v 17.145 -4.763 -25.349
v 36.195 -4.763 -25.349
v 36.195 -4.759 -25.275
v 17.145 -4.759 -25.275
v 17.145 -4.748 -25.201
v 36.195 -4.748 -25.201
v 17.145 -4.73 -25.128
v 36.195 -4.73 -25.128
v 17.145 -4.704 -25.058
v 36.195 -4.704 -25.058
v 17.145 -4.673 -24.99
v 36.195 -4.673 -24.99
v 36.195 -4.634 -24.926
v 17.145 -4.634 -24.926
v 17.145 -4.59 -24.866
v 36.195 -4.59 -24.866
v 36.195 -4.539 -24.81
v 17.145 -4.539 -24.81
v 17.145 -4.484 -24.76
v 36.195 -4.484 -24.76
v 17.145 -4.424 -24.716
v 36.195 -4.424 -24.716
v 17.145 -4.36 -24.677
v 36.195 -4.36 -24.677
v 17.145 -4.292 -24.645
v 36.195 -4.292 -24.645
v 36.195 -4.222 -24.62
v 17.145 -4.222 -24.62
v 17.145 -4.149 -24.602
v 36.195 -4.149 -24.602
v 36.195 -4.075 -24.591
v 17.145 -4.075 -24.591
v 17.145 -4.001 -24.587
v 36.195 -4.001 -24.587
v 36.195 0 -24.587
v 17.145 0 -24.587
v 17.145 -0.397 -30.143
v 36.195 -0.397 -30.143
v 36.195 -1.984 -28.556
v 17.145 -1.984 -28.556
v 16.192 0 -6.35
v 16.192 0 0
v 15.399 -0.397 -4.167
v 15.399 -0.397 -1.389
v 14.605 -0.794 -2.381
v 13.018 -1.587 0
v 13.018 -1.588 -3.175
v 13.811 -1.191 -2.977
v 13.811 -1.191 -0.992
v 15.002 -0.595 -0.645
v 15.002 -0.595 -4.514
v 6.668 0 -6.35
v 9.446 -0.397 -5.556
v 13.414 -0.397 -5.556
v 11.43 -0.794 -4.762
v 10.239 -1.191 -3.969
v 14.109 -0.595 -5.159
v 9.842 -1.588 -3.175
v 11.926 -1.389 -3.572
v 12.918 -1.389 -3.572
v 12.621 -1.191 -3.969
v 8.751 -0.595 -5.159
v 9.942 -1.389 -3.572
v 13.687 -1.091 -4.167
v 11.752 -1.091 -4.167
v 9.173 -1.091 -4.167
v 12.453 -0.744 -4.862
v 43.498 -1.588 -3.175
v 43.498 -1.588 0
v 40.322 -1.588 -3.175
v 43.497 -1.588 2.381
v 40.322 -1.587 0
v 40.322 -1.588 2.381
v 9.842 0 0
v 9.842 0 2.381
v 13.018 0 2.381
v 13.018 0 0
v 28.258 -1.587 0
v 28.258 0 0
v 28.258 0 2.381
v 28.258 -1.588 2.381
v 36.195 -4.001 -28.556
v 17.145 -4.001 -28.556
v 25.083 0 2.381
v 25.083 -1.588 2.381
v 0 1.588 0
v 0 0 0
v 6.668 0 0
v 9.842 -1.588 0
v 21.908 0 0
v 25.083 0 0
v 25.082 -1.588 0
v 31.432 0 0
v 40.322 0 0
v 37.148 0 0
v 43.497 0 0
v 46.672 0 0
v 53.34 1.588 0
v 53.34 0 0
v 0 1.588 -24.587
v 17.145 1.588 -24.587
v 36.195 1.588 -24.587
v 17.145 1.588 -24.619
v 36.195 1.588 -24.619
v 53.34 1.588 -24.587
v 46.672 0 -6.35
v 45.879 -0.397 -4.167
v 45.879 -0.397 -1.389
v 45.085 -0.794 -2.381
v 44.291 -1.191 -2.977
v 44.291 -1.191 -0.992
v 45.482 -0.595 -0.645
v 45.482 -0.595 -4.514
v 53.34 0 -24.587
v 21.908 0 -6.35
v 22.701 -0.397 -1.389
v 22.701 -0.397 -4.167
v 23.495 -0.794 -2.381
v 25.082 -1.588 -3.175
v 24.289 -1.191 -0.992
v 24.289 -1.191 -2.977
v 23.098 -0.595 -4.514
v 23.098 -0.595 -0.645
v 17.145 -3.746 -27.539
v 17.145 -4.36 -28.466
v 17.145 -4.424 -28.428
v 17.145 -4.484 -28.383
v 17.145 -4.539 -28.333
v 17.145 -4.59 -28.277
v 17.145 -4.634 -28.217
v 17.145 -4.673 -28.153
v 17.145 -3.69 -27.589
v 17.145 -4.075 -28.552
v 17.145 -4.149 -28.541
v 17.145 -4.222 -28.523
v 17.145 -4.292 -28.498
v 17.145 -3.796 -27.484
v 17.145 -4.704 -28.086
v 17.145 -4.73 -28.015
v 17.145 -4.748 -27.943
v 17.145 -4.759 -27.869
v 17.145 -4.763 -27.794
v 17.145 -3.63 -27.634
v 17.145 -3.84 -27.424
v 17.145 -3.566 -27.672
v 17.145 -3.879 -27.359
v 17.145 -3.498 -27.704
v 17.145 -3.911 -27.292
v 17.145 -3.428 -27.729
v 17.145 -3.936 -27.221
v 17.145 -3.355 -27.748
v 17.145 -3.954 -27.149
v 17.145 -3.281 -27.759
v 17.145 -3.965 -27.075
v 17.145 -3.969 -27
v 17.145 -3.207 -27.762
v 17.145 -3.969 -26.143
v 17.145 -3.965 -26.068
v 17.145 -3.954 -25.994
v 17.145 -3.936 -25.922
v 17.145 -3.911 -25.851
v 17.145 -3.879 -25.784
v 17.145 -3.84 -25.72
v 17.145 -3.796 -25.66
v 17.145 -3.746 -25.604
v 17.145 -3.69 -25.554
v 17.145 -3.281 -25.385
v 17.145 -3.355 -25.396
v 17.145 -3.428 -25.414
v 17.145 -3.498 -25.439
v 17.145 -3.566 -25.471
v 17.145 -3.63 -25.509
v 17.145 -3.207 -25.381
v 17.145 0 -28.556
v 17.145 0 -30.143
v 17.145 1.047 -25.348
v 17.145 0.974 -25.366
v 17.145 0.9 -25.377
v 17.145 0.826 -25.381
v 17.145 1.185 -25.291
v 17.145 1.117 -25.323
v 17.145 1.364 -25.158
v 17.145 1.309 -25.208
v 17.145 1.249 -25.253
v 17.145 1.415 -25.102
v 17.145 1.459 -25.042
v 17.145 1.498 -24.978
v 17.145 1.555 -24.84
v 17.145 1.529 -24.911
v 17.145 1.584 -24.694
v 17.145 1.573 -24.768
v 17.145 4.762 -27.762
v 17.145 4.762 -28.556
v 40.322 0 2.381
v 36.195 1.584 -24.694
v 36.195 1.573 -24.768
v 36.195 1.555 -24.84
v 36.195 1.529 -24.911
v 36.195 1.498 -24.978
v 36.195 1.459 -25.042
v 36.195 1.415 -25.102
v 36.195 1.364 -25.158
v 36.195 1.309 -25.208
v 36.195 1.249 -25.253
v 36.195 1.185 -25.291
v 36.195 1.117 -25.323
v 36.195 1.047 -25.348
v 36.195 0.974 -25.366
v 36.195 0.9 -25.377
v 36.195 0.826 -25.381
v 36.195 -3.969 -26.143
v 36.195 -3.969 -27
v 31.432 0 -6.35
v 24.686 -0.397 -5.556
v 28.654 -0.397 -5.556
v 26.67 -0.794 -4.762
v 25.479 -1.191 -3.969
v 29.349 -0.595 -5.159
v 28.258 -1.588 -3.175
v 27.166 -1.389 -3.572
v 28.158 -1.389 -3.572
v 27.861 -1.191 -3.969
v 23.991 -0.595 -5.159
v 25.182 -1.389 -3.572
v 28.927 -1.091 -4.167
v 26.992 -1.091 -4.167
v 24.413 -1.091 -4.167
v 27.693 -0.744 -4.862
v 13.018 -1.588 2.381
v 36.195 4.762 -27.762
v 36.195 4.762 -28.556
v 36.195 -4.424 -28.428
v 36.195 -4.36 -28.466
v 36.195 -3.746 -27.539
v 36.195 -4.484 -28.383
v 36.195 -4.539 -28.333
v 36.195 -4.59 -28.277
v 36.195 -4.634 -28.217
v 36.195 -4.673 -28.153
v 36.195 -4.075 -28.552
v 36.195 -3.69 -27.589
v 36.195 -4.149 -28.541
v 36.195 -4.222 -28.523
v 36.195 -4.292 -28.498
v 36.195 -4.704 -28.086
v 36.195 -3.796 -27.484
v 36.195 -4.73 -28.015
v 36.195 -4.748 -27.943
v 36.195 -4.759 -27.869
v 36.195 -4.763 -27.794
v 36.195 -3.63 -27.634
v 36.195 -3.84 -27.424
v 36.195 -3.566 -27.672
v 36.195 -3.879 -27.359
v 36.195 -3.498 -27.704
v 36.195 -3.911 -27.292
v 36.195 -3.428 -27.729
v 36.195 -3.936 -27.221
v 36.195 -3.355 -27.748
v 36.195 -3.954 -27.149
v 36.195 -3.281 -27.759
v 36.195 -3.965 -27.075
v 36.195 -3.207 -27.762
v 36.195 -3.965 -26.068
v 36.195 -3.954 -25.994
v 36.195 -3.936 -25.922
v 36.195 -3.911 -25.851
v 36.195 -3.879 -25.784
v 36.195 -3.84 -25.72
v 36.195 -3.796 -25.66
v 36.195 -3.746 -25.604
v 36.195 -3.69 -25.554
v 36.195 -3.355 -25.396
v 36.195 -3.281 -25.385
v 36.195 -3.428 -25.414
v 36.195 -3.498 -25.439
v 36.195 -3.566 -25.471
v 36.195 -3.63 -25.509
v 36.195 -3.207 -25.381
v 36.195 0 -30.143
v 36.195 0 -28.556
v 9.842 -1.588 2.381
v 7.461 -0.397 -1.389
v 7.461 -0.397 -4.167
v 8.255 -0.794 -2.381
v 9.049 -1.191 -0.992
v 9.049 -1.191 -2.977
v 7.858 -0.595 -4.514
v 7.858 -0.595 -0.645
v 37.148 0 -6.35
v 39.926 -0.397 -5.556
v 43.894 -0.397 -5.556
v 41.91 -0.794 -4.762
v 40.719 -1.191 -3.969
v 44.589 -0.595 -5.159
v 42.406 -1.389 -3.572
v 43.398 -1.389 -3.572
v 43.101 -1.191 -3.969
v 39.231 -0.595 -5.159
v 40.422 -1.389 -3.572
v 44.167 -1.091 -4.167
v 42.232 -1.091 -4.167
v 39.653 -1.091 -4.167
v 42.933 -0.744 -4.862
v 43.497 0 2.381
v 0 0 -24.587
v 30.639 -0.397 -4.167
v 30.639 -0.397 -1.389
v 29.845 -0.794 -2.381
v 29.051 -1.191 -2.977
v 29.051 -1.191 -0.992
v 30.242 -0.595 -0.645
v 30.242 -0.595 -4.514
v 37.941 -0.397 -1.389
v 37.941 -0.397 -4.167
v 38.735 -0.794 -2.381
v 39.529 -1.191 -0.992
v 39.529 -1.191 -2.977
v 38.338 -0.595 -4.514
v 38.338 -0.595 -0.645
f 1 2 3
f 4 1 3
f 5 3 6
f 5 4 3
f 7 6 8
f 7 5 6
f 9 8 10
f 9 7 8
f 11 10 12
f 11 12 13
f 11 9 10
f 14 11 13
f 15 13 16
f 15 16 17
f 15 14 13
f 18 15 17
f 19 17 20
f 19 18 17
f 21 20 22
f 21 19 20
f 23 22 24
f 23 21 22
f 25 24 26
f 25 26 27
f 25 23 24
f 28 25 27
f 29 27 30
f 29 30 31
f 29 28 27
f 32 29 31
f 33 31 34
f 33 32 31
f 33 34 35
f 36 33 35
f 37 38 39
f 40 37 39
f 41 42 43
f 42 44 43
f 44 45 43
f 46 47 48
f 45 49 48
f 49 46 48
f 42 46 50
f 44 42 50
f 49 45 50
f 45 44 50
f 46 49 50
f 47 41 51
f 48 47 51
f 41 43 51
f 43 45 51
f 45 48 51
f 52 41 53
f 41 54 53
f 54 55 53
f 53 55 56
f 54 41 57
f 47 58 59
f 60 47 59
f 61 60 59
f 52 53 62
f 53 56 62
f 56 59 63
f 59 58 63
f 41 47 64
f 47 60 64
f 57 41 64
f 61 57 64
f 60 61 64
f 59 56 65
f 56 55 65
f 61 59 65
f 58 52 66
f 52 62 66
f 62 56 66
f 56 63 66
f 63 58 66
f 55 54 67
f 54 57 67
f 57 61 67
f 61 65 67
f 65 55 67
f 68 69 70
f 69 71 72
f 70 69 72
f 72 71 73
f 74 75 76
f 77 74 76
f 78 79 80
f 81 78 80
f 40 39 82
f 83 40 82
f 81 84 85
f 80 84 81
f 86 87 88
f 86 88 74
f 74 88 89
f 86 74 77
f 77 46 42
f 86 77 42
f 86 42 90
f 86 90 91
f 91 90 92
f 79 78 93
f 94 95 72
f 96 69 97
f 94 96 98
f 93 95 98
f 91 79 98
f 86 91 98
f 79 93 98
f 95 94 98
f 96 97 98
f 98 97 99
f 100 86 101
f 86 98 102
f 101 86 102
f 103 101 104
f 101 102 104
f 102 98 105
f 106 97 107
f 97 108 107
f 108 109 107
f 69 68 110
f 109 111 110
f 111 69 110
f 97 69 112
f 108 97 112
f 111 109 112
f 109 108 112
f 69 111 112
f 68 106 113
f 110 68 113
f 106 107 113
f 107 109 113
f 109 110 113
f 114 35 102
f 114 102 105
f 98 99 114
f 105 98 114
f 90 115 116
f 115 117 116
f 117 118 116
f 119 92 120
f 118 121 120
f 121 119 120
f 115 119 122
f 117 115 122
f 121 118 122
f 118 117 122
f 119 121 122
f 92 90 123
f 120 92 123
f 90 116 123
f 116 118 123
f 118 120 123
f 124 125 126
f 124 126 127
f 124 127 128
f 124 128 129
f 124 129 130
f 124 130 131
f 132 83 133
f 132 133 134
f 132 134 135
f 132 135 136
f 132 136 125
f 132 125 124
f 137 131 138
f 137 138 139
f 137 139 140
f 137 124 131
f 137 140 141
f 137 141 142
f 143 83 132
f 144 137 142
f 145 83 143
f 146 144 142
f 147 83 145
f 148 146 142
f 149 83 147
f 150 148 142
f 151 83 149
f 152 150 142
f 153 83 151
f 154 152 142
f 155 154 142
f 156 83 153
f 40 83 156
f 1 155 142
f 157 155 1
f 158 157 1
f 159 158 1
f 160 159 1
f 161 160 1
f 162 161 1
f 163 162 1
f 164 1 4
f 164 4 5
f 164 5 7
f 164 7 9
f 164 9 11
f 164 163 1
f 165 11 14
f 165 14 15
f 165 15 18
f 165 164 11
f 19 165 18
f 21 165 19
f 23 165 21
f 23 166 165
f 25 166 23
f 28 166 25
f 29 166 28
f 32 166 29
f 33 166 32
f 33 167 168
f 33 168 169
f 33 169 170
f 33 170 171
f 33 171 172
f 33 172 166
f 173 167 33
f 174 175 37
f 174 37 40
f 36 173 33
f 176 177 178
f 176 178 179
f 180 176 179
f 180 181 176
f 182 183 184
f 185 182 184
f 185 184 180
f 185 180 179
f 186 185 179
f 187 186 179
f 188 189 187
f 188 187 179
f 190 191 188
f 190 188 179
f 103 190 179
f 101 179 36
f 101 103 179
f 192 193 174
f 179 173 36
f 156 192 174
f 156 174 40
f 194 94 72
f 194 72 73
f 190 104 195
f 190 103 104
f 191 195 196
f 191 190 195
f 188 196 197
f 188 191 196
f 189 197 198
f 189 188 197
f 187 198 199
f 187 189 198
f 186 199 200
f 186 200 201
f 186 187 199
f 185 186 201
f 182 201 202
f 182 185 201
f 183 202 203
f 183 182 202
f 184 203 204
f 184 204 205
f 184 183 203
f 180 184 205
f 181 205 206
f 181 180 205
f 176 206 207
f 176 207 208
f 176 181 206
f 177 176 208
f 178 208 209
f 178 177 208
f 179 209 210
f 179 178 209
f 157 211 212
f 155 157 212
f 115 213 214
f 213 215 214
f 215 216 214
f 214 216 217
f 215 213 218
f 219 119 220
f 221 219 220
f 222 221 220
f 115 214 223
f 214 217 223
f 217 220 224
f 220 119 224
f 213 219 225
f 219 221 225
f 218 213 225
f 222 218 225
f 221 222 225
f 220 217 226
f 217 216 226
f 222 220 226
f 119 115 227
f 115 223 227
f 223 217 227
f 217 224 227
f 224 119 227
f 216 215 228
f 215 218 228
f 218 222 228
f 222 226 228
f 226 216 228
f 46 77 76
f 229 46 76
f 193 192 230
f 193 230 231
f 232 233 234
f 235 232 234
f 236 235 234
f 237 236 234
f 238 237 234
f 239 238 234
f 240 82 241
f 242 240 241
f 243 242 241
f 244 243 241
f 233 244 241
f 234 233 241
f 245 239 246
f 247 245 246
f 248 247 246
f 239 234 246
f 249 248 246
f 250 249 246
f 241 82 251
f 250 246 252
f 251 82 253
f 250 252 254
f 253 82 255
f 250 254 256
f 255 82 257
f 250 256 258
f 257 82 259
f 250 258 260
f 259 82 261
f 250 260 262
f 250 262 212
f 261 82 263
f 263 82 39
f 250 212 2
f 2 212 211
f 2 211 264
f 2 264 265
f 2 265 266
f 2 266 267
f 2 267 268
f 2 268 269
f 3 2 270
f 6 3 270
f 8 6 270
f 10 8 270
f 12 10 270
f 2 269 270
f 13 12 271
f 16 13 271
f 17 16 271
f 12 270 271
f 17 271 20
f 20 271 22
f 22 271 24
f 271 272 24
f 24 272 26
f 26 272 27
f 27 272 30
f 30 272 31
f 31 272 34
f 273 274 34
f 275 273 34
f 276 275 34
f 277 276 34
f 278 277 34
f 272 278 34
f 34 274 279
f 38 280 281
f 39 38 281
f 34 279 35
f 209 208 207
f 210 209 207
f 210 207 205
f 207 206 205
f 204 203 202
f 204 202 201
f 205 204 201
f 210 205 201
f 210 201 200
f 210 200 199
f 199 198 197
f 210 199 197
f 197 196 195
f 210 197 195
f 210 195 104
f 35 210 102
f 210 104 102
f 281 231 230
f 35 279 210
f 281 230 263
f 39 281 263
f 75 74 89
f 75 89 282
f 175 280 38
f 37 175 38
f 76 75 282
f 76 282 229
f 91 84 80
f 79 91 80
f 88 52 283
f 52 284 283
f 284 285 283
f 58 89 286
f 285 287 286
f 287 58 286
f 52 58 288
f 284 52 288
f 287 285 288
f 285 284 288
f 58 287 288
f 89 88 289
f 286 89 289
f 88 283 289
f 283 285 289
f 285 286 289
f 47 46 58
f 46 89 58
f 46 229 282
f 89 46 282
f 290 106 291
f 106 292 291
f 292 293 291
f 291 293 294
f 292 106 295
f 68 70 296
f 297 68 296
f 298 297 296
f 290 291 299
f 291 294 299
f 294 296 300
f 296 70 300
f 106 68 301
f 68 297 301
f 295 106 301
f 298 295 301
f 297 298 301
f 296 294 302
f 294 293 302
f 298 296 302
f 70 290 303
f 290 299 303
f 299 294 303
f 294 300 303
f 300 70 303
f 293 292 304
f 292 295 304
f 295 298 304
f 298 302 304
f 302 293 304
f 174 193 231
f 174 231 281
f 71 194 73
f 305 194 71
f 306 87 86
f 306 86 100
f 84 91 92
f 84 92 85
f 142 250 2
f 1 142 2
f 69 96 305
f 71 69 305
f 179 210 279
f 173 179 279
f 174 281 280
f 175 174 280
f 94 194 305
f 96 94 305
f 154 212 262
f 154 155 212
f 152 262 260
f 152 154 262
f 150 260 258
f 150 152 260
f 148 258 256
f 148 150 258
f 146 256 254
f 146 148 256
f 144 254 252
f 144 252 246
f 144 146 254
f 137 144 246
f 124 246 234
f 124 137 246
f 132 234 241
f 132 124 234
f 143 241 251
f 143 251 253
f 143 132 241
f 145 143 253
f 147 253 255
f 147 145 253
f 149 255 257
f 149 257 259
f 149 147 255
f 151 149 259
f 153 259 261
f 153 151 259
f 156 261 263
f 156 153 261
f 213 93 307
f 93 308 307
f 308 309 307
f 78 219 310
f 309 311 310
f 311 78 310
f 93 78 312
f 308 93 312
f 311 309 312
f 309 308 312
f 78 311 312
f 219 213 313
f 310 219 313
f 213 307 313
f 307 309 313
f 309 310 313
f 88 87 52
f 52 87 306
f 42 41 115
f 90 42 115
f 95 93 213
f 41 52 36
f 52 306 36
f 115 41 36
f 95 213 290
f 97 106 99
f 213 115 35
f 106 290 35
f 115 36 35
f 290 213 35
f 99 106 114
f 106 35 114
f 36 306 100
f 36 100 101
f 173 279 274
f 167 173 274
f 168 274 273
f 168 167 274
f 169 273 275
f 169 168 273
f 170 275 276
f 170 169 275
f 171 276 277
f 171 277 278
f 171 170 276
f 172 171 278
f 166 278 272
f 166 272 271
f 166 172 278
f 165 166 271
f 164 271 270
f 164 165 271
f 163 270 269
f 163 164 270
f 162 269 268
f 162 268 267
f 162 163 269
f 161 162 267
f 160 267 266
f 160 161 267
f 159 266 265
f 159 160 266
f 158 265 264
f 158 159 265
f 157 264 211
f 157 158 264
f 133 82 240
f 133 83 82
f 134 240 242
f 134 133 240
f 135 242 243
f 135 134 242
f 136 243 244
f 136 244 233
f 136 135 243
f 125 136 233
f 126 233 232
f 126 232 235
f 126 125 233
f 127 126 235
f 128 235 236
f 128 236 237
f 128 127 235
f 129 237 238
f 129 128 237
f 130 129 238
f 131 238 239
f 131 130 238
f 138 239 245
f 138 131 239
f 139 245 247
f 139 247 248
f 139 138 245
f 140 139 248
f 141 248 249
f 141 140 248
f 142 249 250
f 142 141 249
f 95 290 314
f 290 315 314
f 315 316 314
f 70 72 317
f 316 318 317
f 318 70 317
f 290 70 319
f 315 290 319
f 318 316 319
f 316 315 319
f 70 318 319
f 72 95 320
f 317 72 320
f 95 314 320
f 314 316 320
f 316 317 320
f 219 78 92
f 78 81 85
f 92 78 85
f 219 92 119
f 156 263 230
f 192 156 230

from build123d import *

# Parameters (mm, degrees)
SKETCH1_W                = 53.34
SKETCH1_H                = 24.5872
BOSS_EXTRUDE1_DEPTH      = 1.5875
SKETCH2_W                = 3.175
SKETCH2_H                = 2.38125
BOSS_EXTRUDE2_DEPTH      = 1.5875
BOSS_EXTRUDE2_2_DEPTH    = 1.5875
BOSS_EXTRUDE2_3_DEPTH    = 1.5875
LPATTERN1_COUNT          = 3
LPATTERN1_PITCH          = 15.24
BOSS_EXTRUDE3_DEPTH      = 9.525
BOSS_EXTRUDE3_DEPTH_BACK = 9.525
FILLET1_R                = 0.762


with BuildPart() as part:
    # Sketch1 → Boss-Extrude1 (new body)
    with BuildSketch(Plane(origin=(0, 0, 0), x_dir=(1, 0, 0), z_dir=(0, 1, 0))):
        with Locations((26.67, 12.2936)):
            Rectangle(SKETCH1_W, SKETCH1_H)
    extrude(amount=BOSS_EXTRUDE1_DEPTH)



with BuildPart() as body_2:
    # Sketch2 → Boss-Extrude2 (new body)
    with BuildSketch(Plane.XZ):
        with Locations((11.43, 1.190625)):
            Rectangle(SKETCH2_W, SKETCH2_H)
    extrude(amount=BOSS_EXTRUDE2_DEPTH)


with BuildPart() as body_3:
    # Sketch2 → Boss-Extrude2 2 (new body)
    with BuildSketch(Plane.XZ):
        with Locations((26.67, 1.190625)):
            Rectangle(SKETCH2_W, SKETCH2_H)
    extrude(amount=BOSS_EXTRUDE2_2_DEPTH)


with BuildPart() as body_4:
    # Sketch2 → Boss-Extrude2 3 (new body)
    with BuildSketch(Plane.XZ):
        with Locations((41.91, 1.190625)):
            Rectangle(SKETCH2_W, SKETCH2_H)
    extrude(amount=BOSS_EXTRUDE2_3_DEPTH)


with BuildPart() as part_1:
    add(part.part)

    add(body_4.part)  # Loft2 merges body 4
    # Sketch5 → Loft2 section 0
    with BuildSketch(Plane.XZ):
        with BuildLine():
            Line((37.1475, 0), (46.6725, 0))
            Line((46.6725, 0), (46.6725, -6.35))
            Line((46.6725, -6.35), (37.1475, -6.35))
            Line((37.1475, -6.35), (37.1475, 0))
        make_face()
    # Sketch4 → Loft2 section 1
    with BuildSketch(Plane.XZ.offset(1.5875)):
        with BuildLine():
            Line((43.4975, 0), (40.3225, 0))
            Line((40.3225, 0), (40.3225, -3.175))
            Line((40.3225, -3.175), (43.4975, -3.175))
            Line((43.4975, -3.175), (43.4975, 0))
        make_face()
    loft2 = loft()


    add(body_2.part)  # LPattern1 merges body 2

    add(body_3.part)  # LPattern1 merges body 3
    # LPattern1: Loft2 ×3
    with Locations(*[(-i * LPATTERN1_PITCH, 0, 0) for i in range(1, LPATTERN1_COUNT)]):
        add(loft2)

    # Sketch7 → Boss-Extrude3 (add, two sides: drawn at the far end of the back side and taken through both)
    with BuildSketch(Plane.ZY.offset(-26.67).offset(-BOSS_EXTRUDE3_DEPTH_BACK)):
        Polygon((-30.14345, -0.396875), (-28.55595, -1.984375), (-28.55595, -4.7625), (-26.212479769, -4.7625), (-24.5872, -4.7625), (-24.5872, 1.5875), (-25.38095, 1.5875), (-25.38095, -3.96875), (-27.7622, -3.96875), (-27.7622, 4.7625), (-28.55595, 4.7625), (-28.55595, 0), (-30.14345, 0), align=None)
    extrude(amount=BOSS_EXTRUDE3_DEPTH + BOSS_EXTRUDE3_DEPTH_BACK)

    # Fillet1
    fillet1_edges = [part_1.edges().sort_by_distance(p)[0] for p in [
        (26.67, -3.96875, -27.7622),
        (26.67, -3.96875, -25.38095),
        (26.67, 1.5875, -25.38095),
        (26.67, -4.7625, -24.5872),
        (26.67, -4.7625, -28.55595),
    ]]
    fillet(fillet1_edges, radius=FILLET1_R)


solid = part_1.part
